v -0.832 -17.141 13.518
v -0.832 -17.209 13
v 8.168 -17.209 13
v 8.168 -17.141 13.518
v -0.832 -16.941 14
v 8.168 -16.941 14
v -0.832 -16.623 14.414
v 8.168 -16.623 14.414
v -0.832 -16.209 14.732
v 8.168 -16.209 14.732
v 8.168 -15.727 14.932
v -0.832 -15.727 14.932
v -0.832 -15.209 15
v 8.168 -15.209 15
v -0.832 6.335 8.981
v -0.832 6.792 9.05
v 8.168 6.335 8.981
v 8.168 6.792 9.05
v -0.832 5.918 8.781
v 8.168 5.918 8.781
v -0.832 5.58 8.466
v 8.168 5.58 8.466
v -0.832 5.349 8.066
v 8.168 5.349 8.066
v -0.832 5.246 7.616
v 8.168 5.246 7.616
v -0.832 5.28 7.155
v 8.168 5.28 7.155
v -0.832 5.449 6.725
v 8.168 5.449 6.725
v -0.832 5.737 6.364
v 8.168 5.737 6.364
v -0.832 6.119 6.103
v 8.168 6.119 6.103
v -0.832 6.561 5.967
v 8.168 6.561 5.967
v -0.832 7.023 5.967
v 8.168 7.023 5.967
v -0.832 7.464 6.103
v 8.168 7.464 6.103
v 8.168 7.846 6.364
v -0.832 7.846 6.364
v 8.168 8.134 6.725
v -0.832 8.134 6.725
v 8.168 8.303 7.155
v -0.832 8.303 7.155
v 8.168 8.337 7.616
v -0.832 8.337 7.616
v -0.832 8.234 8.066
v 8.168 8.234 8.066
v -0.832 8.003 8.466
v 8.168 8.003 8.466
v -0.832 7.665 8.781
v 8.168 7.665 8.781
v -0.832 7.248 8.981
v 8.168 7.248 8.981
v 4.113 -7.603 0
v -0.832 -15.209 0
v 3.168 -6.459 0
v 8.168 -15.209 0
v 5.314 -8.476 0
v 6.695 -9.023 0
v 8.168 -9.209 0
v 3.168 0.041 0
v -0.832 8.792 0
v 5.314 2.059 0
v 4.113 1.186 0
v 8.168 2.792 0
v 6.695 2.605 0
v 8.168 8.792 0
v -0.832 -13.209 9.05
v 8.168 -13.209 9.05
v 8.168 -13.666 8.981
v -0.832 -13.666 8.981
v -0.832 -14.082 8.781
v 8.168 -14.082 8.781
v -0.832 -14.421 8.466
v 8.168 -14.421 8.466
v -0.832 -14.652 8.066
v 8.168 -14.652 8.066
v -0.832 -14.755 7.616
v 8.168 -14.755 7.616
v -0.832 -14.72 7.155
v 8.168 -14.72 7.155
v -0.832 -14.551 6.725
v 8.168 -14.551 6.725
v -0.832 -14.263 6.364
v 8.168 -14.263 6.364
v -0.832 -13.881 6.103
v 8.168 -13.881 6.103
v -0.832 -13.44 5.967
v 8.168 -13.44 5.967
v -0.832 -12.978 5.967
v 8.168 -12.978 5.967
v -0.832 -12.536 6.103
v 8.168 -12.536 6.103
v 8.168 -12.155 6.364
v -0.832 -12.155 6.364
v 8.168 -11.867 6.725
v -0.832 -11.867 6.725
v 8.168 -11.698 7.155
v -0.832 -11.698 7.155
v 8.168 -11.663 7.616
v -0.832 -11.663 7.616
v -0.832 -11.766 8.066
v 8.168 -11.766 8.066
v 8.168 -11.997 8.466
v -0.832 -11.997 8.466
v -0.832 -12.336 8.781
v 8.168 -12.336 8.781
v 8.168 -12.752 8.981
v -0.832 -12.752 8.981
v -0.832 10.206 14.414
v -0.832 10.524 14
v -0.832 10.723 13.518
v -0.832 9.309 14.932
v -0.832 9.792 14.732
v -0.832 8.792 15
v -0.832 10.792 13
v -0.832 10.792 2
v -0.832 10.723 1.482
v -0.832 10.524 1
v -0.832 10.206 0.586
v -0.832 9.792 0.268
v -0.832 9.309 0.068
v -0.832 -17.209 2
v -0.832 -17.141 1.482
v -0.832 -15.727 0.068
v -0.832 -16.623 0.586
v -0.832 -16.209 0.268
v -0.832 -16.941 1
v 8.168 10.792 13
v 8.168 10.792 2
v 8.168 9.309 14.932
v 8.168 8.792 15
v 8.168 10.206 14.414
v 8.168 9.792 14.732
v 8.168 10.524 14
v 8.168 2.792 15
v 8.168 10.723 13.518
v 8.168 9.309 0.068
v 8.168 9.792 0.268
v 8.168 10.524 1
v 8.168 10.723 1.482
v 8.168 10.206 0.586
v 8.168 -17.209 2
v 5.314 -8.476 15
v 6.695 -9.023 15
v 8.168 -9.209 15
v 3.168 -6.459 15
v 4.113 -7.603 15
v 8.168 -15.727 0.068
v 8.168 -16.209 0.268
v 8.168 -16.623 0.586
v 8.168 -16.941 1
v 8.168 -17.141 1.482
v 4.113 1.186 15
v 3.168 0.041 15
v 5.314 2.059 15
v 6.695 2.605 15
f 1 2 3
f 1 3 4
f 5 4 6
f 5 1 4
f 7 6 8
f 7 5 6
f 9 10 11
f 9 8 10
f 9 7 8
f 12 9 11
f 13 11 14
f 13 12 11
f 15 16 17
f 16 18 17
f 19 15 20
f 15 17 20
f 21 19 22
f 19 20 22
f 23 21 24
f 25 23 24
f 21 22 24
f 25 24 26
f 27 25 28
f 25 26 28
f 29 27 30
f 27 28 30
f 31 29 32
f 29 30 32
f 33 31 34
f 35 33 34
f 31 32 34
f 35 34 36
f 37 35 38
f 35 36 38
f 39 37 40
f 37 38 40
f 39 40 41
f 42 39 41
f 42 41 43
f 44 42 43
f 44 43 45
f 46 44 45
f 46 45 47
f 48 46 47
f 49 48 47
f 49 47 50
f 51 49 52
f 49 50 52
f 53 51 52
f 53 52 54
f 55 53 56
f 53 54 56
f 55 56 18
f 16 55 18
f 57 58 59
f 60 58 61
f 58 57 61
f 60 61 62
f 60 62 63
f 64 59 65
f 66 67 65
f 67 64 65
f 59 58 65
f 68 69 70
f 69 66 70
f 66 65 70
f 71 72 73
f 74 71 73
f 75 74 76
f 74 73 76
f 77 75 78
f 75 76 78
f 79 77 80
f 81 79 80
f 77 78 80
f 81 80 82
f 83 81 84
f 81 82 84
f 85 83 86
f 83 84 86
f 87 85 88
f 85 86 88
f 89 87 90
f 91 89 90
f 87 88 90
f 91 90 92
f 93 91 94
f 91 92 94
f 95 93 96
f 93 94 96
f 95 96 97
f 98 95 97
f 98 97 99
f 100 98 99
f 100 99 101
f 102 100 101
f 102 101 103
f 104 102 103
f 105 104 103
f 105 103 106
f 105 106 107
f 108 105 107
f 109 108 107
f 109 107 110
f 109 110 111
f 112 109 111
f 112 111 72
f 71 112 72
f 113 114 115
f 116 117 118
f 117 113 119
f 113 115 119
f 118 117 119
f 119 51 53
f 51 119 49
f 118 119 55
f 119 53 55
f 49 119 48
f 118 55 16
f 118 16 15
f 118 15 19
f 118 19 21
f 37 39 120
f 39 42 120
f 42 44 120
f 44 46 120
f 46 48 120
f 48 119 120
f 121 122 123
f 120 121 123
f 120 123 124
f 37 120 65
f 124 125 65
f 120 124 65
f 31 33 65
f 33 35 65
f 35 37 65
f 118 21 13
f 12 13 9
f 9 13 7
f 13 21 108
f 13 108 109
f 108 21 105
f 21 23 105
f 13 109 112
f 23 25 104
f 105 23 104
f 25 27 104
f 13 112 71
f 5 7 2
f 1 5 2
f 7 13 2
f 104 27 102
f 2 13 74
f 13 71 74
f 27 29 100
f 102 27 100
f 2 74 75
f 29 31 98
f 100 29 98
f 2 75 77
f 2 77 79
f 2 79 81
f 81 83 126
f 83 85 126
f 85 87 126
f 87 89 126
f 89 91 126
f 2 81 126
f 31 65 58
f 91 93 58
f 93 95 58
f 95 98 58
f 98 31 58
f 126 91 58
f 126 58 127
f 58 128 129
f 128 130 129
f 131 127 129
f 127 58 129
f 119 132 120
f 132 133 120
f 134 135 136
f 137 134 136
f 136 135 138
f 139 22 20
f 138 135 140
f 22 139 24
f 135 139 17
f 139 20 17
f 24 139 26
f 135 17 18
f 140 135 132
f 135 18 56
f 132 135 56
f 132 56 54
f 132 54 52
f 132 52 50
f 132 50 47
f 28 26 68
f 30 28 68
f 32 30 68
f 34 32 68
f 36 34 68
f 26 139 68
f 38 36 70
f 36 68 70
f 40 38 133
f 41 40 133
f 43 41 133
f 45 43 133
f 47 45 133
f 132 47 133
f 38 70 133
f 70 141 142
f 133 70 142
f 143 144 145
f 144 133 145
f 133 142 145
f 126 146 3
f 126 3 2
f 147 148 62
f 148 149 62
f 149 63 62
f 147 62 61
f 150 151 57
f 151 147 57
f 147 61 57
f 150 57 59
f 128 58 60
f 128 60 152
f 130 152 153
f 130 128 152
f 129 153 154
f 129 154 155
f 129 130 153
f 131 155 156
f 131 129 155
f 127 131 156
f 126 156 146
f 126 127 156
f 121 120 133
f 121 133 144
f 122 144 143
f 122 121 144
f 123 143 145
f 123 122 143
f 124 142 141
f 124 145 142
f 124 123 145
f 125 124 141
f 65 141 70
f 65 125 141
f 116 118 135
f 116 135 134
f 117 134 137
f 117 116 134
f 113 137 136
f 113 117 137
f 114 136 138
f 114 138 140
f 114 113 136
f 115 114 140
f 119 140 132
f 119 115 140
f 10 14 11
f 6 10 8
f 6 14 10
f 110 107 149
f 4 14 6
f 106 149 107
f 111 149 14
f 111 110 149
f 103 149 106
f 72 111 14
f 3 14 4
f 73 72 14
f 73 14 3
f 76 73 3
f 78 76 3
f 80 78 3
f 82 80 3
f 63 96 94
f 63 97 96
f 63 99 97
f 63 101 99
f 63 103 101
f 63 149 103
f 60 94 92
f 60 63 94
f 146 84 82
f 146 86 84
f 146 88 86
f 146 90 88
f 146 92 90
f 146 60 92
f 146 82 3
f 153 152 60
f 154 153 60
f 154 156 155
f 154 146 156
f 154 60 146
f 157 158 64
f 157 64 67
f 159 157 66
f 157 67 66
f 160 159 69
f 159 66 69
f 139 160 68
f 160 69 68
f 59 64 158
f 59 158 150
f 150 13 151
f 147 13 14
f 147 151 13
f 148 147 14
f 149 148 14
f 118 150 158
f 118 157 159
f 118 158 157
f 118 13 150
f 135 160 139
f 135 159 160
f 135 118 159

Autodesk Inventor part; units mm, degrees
ref_plane "YZ Plane" through (0, 0, 0) normal (1, 0, 0) x (0, 1, 0)
ref_plane "XZ Plane" through (0, 0, 0) normal (0, 1, 0) x (-1, 0, 0)
ref_plane "XY Plane" through (0, 0, 0) normal (0, 0, 1) x (1, 0, 0)
sketch "Sketch2" plane through (0, 0, 0) normal (0, 0, 1) x (1, 0, 0)
  line L0 (3.1675, -3.2086) -> (3.1675, 0.0414)
  arc A0 (8.1675, 2.7916) -> (3.1675, 0.0414) centre (8.1675, -3.1285) ccw
  line L1 (5.3308, -15.8516) -> (5.3308, -15.8516)
  line L2 (8.1675, 2.7916) -> (8.1675, 10.7916)
  line L3 (3.1675, -3.2086) -> (3.1675, -6.4586)
  arc A1 (3.1675, -6.4586) -> (8.1675, -9.2089) centre (8.1675, -3.2888) ccw
  line L4 (8.1675, -9.2089) -> (8.1675, -17.2089)
  line L5 (8.1675, 10.7916) -> (-0.8325, 10.7916)
  line L6 (8.1675, -17.2089) -> (-0.8325, -17.2089)
  line L7 (-0.8325, 10.7916) -> (-0.8325, -17.2089)
  point P0 (0, 0)
  point P1 (8.1675, -9.2089)
  dimension "d10" = 9
  dimension "d11" = 4
extrude "Extrusion2" add sketch "Sketch2" along normal blind 15
ref_plane "Work Plane1" through (-0.8325, -3.2086, 0) normal (0, 1, 0) x (1, 0, 0)
sketch "Sketch3" plane through (-0.8325, -17.2089, 0) normal (-1, 0, 0) x (0, 0, 1)
  line L0 (0, 28.0006) -> (0, 0) projected
  line L1 (0, 0) -> (15, 0) projected
  line L2 (0, 28.0006) -> (15, 28.0006) projected
  point P0 (7.5, 4)
  point P1 (7.5, 24.0006)
  point P2 (7.5, 0)
  point P3 (7.5, 28.0006)
  dimension "d16" = 7.5
  dimension "d17" = 4
  dimension "d18" = 4
  dimension "d19" = 7.5
hole "Hole1" at (-0.8325, -13.2089, 7.5) at (-0.8325, 6.7916, 7.5) direction (1, 0, 0) diameter 3.1 end through all
fillet "Fillet1" radius 2 4 edges at (3.6675, 10.7916, 15) (3.6675, 10.7916, 0) (3.6675, -17.2089, 0) (3.6675, -17.2089, 15)
properties part number "podstawka silnika_CPY" material "ABS Plastic"
